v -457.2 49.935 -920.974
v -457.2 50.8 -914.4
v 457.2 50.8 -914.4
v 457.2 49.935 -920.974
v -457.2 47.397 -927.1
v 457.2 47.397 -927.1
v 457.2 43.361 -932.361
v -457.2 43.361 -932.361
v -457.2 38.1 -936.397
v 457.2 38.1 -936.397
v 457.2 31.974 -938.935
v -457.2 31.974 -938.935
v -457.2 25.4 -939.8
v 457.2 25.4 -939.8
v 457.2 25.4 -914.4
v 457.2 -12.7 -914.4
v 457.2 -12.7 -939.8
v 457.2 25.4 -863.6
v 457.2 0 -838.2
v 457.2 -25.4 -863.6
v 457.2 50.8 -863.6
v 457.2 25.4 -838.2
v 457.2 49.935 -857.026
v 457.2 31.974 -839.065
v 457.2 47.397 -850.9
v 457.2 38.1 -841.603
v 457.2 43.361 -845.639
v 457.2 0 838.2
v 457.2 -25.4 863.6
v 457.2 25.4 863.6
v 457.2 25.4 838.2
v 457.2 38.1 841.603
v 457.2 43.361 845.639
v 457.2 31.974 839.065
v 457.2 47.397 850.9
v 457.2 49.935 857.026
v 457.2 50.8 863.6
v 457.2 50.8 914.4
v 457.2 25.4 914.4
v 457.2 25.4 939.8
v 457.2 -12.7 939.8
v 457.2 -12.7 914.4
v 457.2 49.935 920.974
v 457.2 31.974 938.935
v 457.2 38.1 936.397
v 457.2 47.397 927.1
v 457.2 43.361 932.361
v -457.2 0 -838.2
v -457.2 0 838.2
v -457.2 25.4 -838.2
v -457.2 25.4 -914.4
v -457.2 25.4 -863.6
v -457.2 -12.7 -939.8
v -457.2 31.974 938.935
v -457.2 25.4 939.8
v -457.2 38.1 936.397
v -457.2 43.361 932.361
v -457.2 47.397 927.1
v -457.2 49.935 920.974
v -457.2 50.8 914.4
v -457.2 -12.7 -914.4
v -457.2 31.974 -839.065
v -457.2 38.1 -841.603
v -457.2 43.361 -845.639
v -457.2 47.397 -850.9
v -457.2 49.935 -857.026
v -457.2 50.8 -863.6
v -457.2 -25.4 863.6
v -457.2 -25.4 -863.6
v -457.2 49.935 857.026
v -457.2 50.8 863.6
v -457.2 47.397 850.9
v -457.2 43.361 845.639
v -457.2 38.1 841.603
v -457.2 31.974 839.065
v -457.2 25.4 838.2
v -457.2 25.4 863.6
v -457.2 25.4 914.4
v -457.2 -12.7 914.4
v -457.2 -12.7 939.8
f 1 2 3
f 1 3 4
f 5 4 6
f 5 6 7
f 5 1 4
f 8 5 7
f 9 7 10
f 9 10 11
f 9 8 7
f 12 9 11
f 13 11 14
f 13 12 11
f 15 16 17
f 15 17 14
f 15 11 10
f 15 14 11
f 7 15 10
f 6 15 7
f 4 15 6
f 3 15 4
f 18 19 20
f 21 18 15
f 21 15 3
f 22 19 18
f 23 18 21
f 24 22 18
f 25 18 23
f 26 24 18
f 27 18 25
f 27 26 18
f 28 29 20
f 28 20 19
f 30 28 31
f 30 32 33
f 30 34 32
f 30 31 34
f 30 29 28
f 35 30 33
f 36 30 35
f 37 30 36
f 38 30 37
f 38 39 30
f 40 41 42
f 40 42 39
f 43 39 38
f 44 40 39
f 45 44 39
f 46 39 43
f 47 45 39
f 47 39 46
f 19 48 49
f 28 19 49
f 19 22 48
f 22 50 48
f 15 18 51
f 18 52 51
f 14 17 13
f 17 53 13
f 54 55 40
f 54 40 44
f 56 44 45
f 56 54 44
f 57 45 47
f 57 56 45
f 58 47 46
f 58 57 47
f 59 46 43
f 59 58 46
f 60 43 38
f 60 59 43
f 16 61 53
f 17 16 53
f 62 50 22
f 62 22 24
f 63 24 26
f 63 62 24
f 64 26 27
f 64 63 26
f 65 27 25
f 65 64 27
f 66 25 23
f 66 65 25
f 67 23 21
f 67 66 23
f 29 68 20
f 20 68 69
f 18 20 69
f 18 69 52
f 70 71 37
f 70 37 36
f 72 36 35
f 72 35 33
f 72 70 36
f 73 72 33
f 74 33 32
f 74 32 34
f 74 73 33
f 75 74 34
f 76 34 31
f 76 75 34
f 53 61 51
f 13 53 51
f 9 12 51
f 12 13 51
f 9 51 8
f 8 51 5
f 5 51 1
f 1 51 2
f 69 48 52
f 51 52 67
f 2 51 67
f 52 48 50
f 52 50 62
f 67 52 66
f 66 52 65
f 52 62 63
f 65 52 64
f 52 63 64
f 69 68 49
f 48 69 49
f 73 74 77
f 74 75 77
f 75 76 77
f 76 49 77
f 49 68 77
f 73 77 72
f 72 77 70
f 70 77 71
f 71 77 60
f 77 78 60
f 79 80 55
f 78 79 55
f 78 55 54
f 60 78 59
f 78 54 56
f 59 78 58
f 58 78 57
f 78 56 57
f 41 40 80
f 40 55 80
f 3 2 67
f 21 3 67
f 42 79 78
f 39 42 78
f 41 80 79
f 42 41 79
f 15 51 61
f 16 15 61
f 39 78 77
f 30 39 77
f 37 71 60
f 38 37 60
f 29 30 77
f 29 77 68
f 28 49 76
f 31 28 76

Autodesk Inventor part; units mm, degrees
ref_plane "YZ Plane" through (0, 0, 0) normal (1, 0, 0) x (0, 1, 0)
ref_plane "XZ Plane" through (0, 0, 0) normal (0, 1, 0) x (-1, 0, 0)
ref_plane "XY Plane" through (0, 0, 0) normal (0, 0, 1) x (1, 0, 0)
sketch "Sketch1" plane through (0, 0, 0) normal (1, 0, 0) x (0, 1, 0)
  line L0 (-12.7, 939.8) -> (-12.7, 914.4)
  line L1 (-12.7, 914.4) -> (25.4, 914.4)
  line L2 (25.4, 914.4) -> (25.4, 863.6)
  line L3 (25.4, -914.4) -> (-12.7, -914.4)
  line L4 (-12.7, -914.4) -> (-12.7, -939.8)
  line L5 (-12.7, -939.8) -> (50.8, -939.8)
  line L6 (50.8, -939.8) -> (50.8, -838.2)
  line L7 (50.8, 939.8) -> (-12.7, 939.8)
  line L8 (25.4, 863.6) -> (-25.4, 863.6)
  line L9 (-25.4, 863.6) -> (-25.4, -863.6)
  line L10 (-25.4, -863.6) -> (25.4, -863.6)
  line L11 (25.4, -863.6) -> (25.4, -914.4)
  line L12 (25.4, 863.6) -> (25.4, -863.6) construction
  line L13 (50.8, -838.2) -> (0, -838.2)
  line L14 (0, -838.2) -> (0, 838.2)
  line L15 (0, 838.2) -> (50.8, 838.2)
  line L16 (50.8, 838.2) -> (50.8, 939.8)
  line L17 (50.8, -838.2) -> (50.8, 838.2) construction
  point P0 (0, 0)
  point P1 (0, 0)
  point P2 (0, 0)
  dimension "d4" = 25.4
  dimension "d5" = 1879.6
  dimension "d7" = 63.5
  dimension "d11" = 50.8
  dimension "d12" = 50.8
  dimension "d13" = 50.8
  dimension "d14" = 76.2
  dimension "d15" = 25.4
  dimension "d16" = 25.4
  dimension "d17" = 25.4
extrude "Extrusion1" add sketch "Sketch1" along normal mid plane 914.4
fillet "Fillet1" radius 25.4 4 edges at (0, 50.8, 939.8) (0, 50.8, -939.8) (0, 50.8, -838.2) (0, 50.8, 838.2)
properties part number "Gondola Base Plate" material "Steel, Alloy"
